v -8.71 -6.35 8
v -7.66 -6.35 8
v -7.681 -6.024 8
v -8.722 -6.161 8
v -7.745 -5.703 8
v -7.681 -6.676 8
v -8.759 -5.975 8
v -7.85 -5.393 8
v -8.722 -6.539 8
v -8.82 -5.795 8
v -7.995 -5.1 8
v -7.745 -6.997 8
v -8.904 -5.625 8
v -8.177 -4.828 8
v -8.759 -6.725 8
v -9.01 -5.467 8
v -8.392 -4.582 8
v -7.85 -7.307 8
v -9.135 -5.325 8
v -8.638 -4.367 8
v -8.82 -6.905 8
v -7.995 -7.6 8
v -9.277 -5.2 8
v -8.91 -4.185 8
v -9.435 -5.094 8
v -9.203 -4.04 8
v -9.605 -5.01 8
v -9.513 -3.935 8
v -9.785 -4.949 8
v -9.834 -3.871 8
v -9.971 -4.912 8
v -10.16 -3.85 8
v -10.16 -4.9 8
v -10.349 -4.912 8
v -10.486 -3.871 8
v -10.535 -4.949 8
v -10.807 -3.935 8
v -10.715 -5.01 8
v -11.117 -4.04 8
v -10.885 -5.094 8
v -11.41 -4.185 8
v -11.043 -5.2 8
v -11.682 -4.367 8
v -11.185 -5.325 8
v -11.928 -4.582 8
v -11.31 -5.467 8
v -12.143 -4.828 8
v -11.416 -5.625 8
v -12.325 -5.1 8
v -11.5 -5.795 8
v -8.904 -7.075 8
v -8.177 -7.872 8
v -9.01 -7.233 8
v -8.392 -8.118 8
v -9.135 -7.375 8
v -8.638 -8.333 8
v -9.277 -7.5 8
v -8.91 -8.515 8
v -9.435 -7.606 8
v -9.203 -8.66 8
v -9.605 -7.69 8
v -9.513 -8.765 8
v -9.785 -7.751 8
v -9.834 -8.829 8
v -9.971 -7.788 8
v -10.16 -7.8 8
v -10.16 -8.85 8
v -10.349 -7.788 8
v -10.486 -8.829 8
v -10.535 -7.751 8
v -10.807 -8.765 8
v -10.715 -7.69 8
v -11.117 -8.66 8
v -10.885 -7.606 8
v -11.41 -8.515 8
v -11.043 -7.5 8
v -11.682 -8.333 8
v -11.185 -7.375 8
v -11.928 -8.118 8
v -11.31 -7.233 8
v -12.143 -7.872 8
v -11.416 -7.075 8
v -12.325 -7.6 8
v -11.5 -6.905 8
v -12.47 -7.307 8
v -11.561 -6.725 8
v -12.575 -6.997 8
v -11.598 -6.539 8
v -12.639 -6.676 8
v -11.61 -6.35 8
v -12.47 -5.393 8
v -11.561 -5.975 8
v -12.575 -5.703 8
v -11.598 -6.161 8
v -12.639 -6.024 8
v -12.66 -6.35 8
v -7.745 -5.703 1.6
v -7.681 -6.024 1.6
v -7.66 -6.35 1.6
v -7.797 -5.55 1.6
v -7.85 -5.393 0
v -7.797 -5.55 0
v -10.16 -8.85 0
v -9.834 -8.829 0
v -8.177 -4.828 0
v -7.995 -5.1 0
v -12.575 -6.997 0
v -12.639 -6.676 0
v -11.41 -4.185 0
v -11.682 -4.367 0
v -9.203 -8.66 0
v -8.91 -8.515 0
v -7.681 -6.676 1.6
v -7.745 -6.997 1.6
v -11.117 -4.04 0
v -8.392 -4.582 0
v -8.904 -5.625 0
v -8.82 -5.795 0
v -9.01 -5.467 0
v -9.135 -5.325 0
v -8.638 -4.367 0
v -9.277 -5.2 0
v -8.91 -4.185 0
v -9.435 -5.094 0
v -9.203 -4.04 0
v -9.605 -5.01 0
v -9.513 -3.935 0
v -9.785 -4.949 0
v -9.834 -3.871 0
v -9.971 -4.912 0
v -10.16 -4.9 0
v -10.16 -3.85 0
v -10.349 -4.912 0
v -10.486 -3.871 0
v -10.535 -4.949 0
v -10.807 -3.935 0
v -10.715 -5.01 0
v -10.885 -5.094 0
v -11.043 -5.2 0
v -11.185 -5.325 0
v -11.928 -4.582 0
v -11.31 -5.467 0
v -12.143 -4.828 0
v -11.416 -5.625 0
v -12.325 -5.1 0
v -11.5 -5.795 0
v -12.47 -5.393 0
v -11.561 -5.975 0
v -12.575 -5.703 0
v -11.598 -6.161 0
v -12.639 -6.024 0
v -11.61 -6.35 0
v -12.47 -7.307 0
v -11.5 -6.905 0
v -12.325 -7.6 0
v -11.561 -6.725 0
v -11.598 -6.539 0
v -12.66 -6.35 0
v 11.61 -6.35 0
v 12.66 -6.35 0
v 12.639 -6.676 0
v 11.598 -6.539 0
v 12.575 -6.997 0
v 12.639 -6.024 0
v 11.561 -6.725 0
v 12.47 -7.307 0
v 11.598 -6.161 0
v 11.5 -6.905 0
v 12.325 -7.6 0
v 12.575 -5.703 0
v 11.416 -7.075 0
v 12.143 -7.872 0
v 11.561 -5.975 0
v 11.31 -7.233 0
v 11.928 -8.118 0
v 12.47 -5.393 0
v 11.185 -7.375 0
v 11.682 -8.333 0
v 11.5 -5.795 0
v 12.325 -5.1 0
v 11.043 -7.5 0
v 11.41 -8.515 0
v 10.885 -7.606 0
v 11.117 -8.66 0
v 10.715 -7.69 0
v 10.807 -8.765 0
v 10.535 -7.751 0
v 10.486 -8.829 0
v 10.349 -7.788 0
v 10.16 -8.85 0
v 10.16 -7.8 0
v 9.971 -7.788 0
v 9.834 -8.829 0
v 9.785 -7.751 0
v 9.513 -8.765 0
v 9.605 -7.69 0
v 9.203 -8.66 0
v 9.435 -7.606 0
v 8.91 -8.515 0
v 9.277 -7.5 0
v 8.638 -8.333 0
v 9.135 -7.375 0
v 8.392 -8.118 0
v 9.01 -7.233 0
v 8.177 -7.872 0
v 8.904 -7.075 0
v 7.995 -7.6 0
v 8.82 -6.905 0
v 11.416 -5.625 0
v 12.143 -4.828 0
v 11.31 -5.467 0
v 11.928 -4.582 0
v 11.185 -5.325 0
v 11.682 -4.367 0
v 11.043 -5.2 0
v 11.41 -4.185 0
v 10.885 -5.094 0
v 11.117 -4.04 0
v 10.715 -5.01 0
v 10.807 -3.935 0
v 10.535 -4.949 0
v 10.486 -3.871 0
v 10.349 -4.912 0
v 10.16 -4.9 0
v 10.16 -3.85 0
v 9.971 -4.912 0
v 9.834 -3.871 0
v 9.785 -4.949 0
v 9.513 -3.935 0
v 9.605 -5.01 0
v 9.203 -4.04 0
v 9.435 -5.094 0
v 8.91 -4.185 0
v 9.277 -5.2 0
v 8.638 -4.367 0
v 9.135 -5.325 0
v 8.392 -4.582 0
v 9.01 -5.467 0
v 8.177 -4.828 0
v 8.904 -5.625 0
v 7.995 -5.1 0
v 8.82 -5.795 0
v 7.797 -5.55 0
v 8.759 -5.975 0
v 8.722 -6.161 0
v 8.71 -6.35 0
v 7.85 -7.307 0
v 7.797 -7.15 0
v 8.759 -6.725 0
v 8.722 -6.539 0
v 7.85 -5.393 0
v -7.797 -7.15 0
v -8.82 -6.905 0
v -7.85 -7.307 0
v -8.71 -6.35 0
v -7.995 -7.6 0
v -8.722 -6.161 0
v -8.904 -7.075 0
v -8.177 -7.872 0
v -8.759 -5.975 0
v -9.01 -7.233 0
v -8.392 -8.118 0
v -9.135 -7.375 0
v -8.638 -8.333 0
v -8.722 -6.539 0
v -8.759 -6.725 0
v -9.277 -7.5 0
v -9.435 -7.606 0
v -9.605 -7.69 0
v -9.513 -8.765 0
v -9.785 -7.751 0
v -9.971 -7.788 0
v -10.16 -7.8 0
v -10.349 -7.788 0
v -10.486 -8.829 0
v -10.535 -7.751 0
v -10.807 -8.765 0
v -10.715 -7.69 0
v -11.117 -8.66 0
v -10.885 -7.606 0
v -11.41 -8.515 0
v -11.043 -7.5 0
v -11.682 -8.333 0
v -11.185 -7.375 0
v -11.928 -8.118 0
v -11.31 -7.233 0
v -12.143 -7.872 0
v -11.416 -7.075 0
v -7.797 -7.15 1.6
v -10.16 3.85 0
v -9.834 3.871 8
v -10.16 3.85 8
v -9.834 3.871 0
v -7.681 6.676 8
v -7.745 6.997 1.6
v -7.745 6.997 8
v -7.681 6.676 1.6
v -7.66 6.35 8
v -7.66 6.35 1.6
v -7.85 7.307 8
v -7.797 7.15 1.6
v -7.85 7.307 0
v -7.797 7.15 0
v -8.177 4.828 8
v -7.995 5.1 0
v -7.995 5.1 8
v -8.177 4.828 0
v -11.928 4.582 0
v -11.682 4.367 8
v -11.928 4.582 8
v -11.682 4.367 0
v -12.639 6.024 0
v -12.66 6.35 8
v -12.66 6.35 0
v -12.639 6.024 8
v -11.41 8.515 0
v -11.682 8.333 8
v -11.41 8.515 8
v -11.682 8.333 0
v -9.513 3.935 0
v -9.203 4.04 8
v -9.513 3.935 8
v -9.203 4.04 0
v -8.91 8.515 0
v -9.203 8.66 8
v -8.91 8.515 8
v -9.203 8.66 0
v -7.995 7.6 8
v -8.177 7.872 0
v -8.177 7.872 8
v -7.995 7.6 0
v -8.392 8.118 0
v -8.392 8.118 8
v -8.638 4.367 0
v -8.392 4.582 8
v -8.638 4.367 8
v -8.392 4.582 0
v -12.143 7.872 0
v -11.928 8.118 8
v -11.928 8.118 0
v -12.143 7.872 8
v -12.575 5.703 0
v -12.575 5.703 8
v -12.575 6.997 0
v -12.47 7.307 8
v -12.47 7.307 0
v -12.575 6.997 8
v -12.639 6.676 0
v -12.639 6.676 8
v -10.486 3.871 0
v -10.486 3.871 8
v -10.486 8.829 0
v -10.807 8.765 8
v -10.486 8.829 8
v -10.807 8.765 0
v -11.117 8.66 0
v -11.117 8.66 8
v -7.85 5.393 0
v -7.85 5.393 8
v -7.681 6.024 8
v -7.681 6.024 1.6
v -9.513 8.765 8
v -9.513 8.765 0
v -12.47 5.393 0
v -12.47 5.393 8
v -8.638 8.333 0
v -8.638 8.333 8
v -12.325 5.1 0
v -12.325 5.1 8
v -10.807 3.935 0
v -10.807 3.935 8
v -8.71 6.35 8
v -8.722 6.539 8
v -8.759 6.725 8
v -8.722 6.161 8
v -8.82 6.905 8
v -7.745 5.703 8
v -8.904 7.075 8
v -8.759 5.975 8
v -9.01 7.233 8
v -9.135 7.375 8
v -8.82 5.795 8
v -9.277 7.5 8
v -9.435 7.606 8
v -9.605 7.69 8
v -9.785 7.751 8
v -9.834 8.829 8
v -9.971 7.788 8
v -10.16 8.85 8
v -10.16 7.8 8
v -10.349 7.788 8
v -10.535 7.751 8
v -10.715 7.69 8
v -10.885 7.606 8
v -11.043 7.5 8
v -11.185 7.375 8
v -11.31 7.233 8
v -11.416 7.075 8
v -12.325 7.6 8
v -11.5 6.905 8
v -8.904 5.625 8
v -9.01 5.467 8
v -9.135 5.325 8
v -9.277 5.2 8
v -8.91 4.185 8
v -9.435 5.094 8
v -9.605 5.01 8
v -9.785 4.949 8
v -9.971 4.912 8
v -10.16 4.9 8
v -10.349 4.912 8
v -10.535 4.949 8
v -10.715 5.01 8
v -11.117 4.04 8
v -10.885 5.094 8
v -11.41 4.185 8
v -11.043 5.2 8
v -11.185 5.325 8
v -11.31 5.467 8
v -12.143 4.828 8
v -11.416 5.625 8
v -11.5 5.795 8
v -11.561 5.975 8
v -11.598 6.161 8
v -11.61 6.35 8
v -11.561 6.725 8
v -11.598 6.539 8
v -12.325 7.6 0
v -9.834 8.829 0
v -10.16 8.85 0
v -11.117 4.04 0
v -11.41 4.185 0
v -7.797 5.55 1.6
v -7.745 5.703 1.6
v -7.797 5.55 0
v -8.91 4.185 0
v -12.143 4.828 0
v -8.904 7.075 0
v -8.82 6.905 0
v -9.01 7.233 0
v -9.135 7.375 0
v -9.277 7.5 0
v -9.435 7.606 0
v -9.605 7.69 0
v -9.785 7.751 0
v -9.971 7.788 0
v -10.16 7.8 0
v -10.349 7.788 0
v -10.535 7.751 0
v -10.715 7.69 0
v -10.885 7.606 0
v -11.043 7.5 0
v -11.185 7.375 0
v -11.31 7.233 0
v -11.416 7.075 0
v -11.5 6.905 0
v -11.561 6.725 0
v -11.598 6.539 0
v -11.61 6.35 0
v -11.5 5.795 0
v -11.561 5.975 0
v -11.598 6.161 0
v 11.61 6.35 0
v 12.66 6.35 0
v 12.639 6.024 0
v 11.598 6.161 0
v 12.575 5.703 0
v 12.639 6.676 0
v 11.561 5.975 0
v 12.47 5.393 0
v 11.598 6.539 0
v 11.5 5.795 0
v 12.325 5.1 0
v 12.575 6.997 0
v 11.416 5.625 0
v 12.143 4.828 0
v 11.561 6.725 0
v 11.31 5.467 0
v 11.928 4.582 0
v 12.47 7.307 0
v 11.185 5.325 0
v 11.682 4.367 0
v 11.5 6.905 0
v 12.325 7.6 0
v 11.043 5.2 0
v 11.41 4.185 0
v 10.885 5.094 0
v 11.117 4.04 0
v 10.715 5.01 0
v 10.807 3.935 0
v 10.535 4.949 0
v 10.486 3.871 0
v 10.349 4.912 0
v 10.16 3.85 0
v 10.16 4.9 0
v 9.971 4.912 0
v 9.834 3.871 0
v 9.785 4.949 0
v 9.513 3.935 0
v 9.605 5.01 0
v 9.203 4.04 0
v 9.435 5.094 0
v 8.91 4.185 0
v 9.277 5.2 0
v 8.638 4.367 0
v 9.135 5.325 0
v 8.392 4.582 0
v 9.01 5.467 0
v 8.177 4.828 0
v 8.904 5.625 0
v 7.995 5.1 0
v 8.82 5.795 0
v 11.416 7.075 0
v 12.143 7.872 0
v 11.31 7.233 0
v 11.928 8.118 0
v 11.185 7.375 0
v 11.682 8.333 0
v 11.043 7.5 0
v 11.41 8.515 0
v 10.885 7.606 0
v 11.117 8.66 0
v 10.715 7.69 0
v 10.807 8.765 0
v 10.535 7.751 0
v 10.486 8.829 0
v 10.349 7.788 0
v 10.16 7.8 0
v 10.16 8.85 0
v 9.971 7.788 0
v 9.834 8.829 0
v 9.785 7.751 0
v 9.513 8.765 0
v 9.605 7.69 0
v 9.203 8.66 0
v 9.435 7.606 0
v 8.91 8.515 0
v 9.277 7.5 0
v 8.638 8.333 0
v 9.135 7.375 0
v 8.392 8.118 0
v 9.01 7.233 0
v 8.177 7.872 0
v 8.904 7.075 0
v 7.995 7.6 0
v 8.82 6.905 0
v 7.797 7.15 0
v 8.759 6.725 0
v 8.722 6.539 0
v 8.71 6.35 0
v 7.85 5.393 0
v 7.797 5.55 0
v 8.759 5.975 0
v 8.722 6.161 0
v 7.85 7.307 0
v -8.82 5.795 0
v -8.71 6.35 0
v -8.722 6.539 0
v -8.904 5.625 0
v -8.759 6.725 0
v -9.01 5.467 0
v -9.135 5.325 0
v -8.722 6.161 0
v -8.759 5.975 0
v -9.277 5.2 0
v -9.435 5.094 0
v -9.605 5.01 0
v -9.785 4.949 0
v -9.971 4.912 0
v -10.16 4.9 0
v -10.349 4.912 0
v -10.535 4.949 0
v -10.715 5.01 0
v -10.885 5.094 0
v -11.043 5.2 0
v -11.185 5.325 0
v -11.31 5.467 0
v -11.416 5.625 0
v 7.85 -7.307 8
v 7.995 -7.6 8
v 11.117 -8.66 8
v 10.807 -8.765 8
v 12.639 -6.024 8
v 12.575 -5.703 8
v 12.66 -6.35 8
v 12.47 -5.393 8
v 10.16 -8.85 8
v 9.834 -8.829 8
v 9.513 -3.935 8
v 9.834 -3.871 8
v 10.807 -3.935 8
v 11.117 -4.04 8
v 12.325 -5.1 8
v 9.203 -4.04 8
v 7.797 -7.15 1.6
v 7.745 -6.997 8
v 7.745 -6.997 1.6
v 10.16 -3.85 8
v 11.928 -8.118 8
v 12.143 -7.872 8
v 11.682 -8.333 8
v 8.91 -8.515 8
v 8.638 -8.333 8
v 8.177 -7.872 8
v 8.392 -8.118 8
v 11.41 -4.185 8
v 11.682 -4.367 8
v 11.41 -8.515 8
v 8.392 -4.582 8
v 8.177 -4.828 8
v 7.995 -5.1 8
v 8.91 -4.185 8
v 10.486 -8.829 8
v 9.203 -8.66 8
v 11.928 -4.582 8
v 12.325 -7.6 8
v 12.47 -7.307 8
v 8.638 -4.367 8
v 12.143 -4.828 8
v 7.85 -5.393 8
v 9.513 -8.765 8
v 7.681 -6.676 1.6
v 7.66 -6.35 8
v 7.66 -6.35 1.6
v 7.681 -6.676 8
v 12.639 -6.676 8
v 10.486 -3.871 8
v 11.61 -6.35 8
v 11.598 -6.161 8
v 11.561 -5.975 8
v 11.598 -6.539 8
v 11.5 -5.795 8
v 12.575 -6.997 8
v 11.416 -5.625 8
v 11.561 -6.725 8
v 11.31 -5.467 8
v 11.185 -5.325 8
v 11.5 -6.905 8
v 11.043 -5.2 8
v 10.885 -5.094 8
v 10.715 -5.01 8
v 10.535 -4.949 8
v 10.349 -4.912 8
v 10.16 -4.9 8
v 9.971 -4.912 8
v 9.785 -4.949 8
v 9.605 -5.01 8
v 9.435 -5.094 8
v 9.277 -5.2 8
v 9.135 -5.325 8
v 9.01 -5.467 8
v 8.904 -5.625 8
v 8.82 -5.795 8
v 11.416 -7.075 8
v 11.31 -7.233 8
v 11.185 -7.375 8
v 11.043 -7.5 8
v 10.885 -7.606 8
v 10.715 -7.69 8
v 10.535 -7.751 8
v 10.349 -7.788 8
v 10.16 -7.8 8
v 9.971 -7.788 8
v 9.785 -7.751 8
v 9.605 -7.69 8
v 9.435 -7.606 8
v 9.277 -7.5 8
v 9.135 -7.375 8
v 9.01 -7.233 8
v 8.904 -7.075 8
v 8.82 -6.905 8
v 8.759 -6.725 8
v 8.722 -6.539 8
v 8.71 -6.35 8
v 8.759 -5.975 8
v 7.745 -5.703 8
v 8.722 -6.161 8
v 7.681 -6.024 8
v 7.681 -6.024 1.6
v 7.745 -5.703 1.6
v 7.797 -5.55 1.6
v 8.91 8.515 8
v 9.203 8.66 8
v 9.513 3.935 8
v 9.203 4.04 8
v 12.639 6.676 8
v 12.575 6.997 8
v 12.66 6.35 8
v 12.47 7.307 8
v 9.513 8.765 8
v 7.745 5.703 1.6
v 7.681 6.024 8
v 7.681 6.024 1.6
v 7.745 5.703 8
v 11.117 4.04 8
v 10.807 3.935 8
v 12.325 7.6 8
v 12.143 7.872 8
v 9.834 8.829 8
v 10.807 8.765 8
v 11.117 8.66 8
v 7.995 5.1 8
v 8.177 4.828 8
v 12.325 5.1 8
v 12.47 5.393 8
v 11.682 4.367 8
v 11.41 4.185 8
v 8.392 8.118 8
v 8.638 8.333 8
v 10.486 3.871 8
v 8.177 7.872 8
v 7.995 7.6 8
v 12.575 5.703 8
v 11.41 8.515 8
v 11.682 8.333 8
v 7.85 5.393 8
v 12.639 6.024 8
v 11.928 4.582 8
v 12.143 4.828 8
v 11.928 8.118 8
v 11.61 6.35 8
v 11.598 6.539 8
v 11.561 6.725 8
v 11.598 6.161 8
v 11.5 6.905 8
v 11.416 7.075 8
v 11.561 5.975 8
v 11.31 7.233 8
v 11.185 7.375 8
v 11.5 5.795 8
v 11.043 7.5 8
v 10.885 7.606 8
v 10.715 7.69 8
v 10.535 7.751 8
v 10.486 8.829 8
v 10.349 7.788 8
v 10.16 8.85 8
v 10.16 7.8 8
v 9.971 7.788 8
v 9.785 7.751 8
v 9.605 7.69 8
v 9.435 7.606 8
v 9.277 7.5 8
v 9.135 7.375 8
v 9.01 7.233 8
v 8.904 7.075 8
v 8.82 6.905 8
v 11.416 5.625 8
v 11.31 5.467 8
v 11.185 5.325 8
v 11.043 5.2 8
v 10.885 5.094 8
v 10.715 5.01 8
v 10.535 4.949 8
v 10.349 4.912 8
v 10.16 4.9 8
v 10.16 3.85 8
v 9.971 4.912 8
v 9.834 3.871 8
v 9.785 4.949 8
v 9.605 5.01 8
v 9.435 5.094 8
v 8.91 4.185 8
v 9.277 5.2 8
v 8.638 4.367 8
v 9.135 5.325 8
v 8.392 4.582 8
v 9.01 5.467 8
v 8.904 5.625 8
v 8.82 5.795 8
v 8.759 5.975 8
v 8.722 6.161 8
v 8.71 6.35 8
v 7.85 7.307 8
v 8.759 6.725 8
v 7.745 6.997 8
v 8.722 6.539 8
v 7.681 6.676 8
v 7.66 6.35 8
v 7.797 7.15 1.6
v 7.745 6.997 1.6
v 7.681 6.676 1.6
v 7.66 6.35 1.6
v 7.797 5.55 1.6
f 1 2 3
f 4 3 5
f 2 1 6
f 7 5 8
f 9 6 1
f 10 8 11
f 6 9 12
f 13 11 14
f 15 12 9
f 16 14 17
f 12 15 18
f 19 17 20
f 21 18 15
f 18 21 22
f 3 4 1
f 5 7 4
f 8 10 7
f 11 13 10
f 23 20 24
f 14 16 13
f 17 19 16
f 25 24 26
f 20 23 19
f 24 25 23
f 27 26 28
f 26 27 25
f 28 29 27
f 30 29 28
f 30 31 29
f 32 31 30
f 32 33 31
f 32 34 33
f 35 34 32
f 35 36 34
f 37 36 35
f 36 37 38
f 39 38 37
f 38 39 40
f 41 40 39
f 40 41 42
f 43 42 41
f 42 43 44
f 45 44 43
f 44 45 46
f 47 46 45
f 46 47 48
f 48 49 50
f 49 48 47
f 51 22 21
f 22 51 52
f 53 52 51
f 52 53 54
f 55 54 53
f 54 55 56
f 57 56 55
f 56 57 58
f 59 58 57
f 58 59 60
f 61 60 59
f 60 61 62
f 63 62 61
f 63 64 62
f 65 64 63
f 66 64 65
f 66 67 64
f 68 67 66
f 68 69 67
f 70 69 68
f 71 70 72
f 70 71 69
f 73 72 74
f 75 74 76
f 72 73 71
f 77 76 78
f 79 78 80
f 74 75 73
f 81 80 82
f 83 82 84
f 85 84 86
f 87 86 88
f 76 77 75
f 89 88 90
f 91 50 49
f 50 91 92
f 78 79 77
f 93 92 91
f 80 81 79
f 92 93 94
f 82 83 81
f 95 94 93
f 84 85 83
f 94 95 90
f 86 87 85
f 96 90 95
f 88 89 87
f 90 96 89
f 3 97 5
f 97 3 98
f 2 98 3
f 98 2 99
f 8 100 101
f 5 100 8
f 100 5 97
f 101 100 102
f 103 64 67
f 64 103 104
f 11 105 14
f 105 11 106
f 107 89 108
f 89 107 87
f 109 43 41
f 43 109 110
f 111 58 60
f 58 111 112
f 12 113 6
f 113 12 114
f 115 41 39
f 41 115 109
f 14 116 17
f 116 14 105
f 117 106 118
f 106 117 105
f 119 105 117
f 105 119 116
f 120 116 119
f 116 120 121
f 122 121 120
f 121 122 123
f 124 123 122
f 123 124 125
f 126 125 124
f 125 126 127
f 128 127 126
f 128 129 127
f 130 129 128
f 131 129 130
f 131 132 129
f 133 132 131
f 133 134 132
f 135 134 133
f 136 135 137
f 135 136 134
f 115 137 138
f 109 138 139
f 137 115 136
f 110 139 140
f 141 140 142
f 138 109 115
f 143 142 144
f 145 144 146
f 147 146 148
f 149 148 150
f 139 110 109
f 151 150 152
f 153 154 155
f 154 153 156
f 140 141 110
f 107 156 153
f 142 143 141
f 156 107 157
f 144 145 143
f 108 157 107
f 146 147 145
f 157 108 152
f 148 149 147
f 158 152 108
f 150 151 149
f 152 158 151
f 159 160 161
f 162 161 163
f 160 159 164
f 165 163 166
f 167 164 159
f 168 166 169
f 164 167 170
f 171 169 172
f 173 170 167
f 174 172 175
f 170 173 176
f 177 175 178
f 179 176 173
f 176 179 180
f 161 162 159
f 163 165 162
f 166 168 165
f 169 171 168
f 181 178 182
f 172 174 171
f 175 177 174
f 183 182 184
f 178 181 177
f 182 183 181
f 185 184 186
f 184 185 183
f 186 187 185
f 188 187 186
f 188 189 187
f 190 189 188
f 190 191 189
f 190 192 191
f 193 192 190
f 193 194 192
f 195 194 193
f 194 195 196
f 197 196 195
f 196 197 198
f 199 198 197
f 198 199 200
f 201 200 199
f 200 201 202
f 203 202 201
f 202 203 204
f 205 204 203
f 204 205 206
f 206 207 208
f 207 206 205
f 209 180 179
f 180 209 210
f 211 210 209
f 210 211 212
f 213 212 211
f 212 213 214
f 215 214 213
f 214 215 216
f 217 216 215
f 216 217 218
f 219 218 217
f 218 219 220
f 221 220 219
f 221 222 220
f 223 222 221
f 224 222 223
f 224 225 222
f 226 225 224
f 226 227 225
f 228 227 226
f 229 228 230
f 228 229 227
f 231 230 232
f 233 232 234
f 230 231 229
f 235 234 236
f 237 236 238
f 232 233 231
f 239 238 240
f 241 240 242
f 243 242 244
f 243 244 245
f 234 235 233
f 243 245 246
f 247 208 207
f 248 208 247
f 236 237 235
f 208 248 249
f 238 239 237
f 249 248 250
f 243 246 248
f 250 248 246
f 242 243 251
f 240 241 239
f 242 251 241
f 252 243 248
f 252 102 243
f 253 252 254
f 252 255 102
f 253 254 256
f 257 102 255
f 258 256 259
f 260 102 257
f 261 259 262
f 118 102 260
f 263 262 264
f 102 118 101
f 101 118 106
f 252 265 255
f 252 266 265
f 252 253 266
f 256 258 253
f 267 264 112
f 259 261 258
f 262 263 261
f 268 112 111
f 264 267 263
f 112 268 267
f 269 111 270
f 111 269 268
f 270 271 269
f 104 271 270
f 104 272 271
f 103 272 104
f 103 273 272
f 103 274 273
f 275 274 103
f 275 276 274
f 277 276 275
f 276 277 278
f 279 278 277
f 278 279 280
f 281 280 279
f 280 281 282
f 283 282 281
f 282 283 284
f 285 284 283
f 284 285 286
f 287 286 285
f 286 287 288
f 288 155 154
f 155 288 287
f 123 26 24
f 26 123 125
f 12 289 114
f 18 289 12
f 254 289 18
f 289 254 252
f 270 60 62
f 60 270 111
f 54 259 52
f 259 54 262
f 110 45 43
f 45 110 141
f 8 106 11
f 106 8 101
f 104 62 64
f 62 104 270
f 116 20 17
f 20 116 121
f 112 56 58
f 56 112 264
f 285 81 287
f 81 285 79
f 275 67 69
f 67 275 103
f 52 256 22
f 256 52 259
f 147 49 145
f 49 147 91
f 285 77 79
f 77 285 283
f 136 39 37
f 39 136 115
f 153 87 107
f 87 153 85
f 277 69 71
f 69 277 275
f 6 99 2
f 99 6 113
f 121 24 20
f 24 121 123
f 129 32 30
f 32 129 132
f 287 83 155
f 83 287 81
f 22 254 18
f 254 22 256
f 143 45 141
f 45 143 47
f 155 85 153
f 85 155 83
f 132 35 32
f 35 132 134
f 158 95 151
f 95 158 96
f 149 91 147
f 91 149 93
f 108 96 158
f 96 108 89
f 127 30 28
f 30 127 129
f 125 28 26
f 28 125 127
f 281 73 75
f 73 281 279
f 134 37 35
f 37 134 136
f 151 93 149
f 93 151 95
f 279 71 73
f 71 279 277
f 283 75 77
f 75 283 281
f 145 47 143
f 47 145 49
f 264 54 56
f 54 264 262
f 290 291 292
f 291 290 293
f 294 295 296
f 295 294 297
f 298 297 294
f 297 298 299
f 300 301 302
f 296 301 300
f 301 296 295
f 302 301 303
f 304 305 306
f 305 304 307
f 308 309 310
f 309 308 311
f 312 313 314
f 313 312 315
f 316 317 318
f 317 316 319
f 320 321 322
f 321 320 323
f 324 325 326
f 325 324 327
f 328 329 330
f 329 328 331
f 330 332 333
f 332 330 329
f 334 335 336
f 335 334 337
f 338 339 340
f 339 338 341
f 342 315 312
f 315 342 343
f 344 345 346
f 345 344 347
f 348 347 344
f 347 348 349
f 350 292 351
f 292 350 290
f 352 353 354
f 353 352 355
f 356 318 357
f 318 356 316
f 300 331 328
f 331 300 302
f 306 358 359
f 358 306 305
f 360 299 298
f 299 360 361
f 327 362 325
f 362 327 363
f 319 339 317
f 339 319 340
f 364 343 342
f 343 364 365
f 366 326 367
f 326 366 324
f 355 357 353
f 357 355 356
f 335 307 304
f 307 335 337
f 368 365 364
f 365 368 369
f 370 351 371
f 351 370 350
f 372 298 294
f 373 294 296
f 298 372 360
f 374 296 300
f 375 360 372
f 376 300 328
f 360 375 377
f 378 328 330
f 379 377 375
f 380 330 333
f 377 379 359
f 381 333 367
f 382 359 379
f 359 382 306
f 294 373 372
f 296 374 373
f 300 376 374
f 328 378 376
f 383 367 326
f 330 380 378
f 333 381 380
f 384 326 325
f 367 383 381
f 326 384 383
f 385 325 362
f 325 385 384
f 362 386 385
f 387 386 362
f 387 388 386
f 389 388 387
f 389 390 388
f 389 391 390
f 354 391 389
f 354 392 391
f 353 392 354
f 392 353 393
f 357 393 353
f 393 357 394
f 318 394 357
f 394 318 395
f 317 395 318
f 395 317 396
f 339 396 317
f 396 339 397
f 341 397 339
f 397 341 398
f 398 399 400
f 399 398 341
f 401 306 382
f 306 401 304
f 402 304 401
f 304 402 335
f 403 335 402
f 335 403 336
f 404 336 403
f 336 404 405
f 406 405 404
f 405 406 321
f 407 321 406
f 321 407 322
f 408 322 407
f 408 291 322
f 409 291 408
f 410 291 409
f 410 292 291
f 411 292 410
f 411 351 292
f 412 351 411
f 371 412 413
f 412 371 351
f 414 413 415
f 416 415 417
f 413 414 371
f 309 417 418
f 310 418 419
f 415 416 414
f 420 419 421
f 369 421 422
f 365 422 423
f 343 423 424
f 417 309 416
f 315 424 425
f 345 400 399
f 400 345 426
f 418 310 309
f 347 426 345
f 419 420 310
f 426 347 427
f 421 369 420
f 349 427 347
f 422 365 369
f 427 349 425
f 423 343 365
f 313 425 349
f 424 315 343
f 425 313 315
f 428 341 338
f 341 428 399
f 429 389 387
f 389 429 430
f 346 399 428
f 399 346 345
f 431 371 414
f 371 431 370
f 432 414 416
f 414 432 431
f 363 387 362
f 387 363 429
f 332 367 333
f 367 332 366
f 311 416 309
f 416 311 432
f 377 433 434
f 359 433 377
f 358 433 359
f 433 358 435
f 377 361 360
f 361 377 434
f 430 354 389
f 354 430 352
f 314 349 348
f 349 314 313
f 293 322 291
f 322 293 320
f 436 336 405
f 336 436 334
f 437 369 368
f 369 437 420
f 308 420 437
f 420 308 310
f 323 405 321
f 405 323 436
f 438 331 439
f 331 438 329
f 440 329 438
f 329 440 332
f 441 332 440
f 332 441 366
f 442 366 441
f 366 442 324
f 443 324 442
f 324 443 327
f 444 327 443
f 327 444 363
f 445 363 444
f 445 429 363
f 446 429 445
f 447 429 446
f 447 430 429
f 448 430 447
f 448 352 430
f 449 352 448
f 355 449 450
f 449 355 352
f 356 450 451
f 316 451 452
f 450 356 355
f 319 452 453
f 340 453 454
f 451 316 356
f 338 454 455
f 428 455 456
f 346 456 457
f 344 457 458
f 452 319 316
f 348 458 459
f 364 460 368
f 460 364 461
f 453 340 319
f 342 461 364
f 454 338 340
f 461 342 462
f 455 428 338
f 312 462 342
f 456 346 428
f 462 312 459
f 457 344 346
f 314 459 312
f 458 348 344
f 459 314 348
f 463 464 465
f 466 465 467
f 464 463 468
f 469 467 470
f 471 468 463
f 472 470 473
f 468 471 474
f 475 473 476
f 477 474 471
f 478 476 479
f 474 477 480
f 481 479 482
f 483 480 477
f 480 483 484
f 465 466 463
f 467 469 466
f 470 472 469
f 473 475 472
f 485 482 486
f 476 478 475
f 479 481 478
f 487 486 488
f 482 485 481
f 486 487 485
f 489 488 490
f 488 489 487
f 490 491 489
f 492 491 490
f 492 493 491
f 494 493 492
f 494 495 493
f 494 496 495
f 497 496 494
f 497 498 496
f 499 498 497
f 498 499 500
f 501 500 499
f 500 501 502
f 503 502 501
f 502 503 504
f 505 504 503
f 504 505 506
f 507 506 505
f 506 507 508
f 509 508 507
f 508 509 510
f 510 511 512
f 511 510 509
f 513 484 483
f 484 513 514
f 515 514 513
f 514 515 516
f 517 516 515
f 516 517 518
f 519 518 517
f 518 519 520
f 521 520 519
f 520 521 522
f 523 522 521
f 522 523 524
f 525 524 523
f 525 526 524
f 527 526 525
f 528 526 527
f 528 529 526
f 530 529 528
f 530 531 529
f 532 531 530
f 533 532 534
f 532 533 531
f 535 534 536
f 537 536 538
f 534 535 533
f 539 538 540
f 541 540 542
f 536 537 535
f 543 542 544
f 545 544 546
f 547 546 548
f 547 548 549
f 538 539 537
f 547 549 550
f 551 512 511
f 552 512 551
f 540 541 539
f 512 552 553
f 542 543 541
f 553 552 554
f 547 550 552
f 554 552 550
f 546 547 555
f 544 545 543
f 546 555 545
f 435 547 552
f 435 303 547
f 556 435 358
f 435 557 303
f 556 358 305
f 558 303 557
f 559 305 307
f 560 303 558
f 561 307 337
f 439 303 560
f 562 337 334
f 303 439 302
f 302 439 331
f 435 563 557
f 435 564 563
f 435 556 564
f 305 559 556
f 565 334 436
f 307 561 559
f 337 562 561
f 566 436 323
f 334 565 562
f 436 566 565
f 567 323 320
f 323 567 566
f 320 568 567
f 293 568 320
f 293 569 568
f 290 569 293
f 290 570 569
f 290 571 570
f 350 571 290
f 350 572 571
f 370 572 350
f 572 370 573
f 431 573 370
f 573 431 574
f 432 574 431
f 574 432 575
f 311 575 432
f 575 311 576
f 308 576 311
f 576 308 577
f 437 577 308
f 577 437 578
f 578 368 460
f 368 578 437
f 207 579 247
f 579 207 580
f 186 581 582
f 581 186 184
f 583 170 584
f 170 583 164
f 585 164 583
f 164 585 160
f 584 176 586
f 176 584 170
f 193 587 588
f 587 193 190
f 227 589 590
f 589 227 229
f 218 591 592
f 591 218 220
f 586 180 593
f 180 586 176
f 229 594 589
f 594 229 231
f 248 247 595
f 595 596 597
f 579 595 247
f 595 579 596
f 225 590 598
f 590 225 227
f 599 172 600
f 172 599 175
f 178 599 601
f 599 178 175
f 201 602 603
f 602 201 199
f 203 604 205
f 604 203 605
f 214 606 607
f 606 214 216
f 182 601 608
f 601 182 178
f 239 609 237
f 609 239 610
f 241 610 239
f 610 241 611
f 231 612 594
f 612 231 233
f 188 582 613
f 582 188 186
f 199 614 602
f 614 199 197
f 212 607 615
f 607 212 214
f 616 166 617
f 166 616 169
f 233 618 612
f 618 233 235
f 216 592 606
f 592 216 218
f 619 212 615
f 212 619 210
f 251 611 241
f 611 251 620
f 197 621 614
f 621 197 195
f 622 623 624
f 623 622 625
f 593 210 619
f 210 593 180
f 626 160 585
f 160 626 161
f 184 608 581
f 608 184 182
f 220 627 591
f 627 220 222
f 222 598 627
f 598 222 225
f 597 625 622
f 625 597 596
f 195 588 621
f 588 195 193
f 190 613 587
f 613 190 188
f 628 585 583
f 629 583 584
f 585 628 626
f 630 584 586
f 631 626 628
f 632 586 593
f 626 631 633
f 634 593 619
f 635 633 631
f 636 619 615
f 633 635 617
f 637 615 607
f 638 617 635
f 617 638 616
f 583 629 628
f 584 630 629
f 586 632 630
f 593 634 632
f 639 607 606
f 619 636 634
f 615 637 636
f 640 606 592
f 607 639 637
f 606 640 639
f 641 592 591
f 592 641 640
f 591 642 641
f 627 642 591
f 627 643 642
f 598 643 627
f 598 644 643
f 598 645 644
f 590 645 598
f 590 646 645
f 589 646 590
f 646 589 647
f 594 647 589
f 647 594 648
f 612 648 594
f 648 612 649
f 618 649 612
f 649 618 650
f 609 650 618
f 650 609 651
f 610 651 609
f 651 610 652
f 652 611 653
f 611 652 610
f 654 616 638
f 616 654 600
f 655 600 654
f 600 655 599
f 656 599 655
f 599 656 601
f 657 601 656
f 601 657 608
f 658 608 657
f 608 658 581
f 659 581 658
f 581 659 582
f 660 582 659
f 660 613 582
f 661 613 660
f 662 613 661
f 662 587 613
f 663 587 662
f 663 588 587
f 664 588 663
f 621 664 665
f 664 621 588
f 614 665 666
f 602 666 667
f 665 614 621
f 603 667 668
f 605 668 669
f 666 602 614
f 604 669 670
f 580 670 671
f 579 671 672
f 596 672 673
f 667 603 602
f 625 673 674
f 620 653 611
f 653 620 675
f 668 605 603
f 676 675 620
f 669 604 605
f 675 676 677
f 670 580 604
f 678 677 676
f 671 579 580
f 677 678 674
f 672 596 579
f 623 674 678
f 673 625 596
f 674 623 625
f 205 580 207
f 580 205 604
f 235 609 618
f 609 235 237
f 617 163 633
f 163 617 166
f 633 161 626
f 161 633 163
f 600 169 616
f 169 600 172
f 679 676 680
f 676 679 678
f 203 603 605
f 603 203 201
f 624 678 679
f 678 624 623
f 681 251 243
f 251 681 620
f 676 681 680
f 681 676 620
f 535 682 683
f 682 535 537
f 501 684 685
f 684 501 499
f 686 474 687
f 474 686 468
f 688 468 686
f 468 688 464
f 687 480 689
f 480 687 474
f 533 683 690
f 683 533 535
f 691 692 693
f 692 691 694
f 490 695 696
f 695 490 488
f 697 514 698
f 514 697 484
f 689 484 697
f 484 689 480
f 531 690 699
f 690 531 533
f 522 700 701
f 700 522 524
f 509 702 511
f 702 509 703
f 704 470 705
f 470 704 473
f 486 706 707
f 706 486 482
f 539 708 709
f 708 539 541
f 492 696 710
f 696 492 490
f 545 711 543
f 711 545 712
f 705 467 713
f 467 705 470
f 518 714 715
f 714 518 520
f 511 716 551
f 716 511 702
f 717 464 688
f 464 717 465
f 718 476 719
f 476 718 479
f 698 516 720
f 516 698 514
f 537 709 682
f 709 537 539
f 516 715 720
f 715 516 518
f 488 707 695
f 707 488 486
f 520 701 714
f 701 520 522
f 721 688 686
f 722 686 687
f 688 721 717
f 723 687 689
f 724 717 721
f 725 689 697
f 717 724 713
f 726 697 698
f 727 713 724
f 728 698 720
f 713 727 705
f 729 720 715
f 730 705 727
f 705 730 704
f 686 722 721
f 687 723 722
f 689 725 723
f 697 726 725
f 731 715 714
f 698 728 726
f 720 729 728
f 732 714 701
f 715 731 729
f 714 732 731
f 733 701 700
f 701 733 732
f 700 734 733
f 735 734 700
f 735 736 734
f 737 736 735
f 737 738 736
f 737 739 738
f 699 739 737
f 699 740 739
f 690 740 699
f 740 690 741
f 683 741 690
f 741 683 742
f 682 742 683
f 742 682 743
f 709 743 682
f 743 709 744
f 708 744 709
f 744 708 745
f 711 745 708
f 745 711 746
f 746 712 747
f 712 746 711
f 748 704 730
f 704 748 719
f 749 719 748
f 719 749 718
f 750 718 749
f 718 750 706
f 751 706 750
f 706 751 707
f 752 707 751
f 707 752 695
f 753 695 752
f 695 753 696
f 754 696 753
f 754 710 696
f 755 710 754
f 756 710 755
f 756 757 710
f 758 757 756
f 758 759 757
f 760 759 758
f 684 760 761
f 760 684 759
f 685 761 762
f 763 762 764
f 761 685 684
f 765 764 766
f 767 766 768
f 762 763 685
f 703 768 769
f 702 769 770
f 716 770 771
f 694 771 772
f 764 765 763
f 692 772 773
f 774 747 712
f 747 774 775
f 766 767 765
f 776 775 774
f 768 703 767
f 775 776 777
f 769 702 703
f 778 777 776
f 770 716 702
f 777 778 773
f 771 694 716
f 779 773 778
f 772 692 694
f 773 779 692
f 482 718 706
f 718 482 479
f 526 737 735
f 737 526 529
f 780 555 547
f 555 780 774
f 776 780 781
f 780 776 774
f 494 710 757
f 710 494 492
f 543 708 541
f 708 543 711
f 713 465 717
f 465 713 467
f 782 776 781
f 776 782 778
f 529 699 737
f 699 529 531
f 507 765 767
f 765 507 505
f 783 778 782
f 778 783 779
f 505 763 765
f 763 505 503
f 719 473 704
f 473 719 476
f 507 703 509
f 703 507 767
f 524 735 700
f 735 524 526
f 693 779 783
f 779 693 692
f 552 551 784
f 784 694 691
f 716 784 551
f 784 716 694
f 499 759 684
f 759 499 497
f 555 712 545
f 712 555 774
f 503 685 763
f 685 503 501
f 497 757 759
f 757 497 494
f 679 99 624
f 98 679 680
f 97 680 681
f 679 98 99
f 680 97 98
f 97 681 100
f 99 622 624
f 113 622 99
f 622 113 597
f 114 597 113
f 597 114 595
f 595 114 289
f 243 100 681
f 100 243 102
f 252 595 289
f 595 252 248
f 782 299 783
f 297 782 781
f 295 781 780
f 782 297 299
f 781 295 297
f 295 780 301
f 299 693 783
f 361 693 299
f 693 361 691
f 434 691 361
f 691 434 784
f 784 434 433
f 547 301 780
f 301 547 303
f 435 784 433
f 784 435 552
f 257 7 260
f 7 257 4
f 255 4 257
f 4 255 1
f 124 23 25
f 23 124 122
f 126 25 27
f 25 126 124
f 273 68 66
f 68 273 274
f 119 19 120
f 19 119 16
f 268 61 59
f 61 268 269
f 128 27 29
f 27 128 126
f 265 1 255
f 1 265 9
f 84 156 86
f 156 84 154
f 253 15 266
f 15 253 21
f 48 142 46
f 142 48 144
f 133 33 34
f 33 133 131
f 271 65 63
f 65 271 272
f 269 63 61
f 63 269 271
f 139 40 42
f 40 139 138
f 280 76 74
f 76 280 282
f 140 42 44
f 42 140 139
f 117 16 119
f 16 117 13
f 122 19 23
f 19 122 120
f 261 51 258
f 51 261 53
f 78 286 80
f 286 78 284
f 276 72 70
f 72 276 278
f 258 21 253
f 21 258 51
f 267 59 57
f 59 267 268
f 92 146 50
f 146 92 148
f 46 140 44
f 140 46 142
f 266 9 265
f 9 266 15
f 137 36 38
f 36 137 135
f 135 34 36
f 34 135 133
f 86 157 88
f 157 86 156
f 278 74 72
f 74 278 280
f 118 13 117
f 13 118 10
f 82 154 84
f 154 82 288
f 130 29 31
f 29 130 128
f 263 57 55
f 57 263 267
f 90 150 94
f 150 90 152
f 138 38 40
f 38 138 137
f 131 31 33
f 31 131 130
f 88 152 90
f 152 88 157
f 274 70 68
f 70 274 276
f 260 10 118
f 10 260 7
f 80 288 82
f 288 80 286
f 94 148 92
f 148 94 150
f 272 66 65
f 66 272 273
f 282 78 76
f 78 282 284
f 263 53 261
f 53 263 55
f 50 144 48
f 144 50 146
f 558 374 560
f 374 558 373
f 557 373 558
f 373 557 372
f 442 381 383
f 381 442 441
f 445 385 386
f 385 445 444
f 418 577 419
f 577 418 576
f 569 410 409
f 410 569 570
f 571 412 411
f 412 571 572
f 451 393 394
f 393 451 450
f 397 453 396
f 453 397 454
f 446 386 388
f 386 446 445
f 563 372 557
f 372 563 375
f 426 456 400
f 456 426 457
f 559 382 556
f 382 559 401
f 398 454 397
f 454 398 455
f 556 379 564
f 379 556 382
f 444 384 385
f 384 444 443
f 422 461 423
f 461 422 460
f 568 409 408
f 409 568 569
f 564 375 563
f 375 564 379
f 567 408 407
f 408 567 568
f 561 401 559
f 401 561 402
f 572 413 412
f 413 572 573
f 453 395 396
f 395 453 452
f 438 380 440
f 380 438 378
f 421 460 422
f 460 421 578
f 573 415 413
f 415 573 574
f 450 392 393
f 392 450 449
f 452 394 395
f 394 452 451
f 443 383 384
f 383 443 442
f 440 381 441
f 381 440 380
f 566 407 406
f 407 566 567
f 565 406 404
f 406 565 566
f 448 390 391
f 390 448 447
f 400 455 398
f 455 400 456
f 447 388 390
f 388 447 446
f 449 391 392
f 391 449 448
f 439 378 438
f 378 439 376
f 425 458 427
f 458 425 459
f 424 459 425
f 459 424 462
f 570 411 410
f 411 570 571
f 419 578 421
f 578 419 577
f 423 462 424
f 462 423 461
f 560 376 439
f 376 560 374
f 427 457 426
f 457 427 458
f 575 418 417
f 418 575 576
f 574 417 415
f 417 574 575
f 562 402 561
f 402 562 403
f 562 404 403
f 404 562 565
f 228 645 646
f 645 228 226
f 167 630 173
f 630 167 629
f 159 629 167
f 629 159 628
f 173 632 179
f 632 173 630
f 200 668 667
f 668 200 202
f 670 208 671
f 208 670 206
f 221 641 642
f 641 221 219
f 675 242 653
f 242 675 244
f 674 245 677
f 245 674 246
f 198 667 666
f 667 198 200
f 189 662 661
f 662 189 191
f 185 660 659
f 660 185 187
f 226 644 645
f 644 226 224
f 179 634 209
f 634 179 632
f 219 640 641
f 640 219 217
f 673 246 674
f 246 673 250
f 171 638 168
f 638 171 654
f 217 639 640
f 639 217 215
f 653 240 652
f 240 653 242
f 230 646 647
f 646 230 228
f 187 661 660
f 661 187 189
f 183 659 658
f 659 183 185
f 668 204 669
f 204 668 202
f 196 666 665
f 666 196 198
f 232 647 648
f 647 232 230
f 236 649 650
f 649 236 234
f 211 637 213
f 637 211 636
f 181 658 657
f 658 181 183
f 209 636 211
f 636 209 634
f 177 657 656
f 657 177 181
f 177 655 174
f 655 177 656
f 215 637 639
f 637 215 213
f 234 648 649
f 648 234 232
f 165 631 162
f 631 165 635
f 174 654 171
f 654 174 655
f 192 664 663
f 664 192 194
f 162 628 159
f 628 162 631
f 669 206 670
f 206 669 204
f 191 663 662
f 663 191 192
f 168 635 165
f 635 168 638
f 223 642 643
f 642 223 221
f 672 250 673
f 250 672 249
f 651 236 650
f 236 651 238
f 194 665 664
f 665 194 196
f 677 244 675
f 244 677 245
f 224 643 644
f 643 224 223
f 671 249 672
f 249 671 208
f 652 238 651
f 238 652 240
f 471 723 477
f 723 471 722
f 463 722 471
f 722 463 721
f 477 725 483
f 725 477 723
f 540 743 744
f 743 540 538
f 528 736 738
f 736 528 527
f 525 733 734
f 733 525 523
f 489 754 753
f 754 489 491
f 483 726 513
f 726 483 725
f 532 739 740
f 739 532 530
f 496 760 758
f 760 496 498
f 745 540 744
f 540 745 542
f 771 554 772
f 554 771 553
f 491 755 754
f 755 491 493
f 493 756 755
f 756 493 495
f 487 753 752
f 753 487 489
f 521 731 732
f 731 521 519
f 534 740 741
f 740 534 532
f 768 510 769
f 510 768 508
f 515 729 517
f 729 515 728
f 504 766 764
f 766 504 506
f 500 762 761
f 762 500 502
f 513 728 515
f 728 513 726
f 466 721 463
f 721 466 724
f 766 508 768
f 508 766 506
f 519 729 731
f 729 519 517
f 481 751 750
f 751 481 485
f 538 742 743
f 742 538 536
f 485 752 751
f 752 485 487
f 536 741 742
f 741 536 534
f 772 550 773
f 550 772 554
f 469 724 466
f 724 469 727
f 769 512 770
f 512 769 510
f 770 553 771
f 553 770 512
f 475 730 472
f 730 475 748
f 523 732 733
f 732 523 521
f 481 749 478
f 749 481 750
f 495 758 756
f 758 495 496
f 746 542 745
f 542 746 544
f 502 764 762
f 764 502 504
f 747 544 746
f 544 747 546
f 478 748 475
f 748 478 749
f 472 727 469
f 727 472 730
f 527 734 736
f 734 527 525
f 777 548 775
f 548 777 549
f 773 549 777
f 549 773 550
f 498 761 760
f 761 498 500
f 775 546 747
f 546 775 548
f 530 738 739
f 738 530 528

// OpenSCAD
// file: box.scad
// Stand-in for the 63 x 58 x 35 ABS box (black or clear lid), for assemblies. Not a print.
// Origin: centre of the inside floor. x along the 63 side, y along the 58 side, z up.
// Numbers are the vendor's or read off vendor photos; README lists which. None calipered.

/* [Box, vendor] */
box_l = 63;          // outer, x
box_w = 58;          // outer, y
box_h = 35;          // outer, lid on
col_clear = 39;      // clear wall between corner columns, both walls

/* [Box, read off photos] */
box_wall = 2.5;      // gives the vendor's 53 inside across y
box_floor = 3;
lid_h = 8.5;         // lid outer height
lid_top = 2.5;       // lid plate thickness
lid_lip = 4;         // lid's inner rim, in from the inside wall face
gasket_step = 4.5;   // thickened wall band under the seam
gasket_in = 1.5;     // how far that band stands in from the wall
boss_pitch = 41;     // floor screw bosses, along x, centred (39 to 42.5 by pixel scale)
boss_d = 6;
boss_h = 4;
boss_hole = 2.5;     // takes an M3 self-tapper (guess)
boss_wing = 10;      // wing length across y
boss_wing_t = 2;
boss_wing_h = 2.5;

in_l = box_l - 2*box_wall;                 // 58
in_w = box_w - 2*box_wall;                 // 53
col_x = (in_l - col_clear) / 2;            // 9.5, column size along x
col_y = (in_w - col_clear) / 2;            // 7, column size along y
rim_z = box_h - lid_h - box_floor;         // 23.5, seam above the inside floor
ceil_z = box_h - lid_top - box_floor;      // 29.5, lid underside above the inside floor
wall_top_z = rim_z - gasket_step;          // 19, top of the plain wall a nut can seat on

module box_columns(h = rim_z) {
    for (sx = [-1, 1], sy = [-1, 1]) scale([sx, sy, 1])
        translate([in_l/2 - col_x, in_w/2 - col_y, 0]) cube([col_x, col_y, h]);
}

module box_bosses() {
    for (sx = [-1, 1]) translate([sx*boss_pitch/2, 0, 0]) difference() {
        union() {
            cylinder(d = boss_d, h = boss_h, $fn = 32);
            translate([-boss_wing_t/2, -boss_wing/2, 0]) cube([boss_wing_t, boss_wing, boss_wing_h]);
        }
        translate([0, 0, 0.5]) cylinder(d = boss_hole, h = boss_h, $fn = 24);
    }
}

// holes: list of [wall, along, z, dia]; wall is "x+", "x-", "y+", "y-"; along is the position along that wall from its centre
module wall_hole(h) {
    wall = h[0]; a = h[1]; z = h[2]; d = h[3];
    if (wall == "y+" || wall == "y-") translate([a, (wall == "y+" ? 1 : -1) * (in_w/2 + box_wall/2), z])
        rotate([90, 0, 0]) cylinder(d = d, h = box_wall + 4, center = true, $fn = 48);
    else translate([(wall == "x+" ? 1 : -1) * (in_l/2 + box_wall/2), a, z])
        rotate([0, 90, 0]) cylinder(d = d, h = box_wall + 4, center = true, $fn = 48);
}

module box_body(holes = []) {
    difference() {
        translate([-box_l/2, -box_w/2, -box_floor]) cube([box_l, box_w, box_floor + rim_z]);
        translate([-in_l/2, -in_w/2, 0]) cube([in_l, in_w, rim_z + 1]);
        for (h = holes) wall_hole(h);
    }
    difference() {
        union() {
            box_columns();
            translate([0, 0, wall_top_z]) difference() {      // gasket band
                translate([-in_l/2, -in_w/2, 0]) cube([in_l, in_w, gasket_step]);
                translate([-in_l/2 + gasket_in, -in_w/2 + gasket_in, -1]) cube([in_l - 2*gasket_in, in_w - 2*gasket_in, gasket_step + 2]);
            }
        }
        for (h = holes) wall_hole(h);
    }
    box_bosses();
}

module box_lid() {
    translate([0, 0, rim_z]) difference() {
        translate([-box_l/2, -box_w/2, 0]) cube([box_l, box_w, lid_h]);
        translate([-in_l/2 + lid_lip, -in_w/2 + lid_lip, -1]) cube([in_l - 2*lid_lip, in_w - 2*lid_lip, lid_h - lid_top + 1]);
    }
}

// The space parts may occupy: the cross-shaped floor up to the gasket band, then the lid's recess.
module box_free() {
    difference() {
        translate([-in_l/2, -in_w/2, 0]) cube([in_l, in_w, wall_top_z]);
        box_columns(wall_top_z + 1);
    }
    translate([-in_l/2 + gasket_in, -in_w/2 + gasket_in, wall_top_z]) difference() {
        cube([in_l - 2*gasket_in, in_w - 2*gasket_in, gasket_step]);
        translate([-gasket_in, -gasket_in, -1]) intersection() { translate([gasket_in, gasket_in, 0]) cube([in_l - 2*gasket_in, in_w - 2*gasket_in, 10]); box_columns(10); }
    }
    translate([-in_l/2 + lid_lip, -in_w/2 + lid_lip, rim_z]) cube([in_l - 2*lid_lip, in_w - 2*lid_lip, ceil_z - rim_z]);
}
// file: model.scad
// Carrier for two stacked Adafruit STEMMA QT boards (25.4 x 17.78, holes 20.32 x 12.7) in the 63 x 58 x 35 box.
// Screws to the box's two floor bosses; four M2.5 x 20 screws come up through the posts, the lower board,
// the spacer and the upper board, with nuts on top. Print as shown: plate on the bed, posts up, no supports.
include <box.scad>
part = "carrier";    // carrier | spacer

/* [Plate] */
plate_l = 51;        // x; inside the 58 floor, clear of the short walls
plate_w = 21;        // y
plate_t = 2;
plate_y = -4;        // plate and stack centre, off the box centre, away from the connector wall
corner_r = 2;

/* [Floor bosses] */
slot_w = 3.4;        // M3 self-tapper clearance
slot_play = 2.5;     // each way along x; covers the 39 to 42.5 guess for the boss pitch

/* [Board bays] */
hole_dx = 20.32;     // Adafruit board file
hole_dy = 12.7;
post_h = 3;          // lower board's underside above the plate; clears its solder joints
post_d = 5.5;
screw_d = 2.9;       // M2.5 clearance, printed
head_d = 5;          // M2.5 pan head, in a pocket under the plate
head_h = 1.2;        // pocket depth; the rest of the head hangs in the 4 mm under the plate
spacer_h = 8;        // between the boards; room for the lower board's parts and its plugs
spacer_d = 5;
spacer_web = 1.6;    // bars joining the spacer tubes in pairs

/* [Hidden] */
$fn = 48;
posts = [for (sx = [-1, 1], sy = [-1, 1]) [sx*hole_dx/2, plate_y + sy*hole_dy/2]];

module rrect(l, w, r) { hull() for (sx = [-1, 1], sy = [-1, 1]) translate([sx*(l/2 - r), sy*(w/2 - r)]) circle(r = r); }

module carrier() {
    difference() {
        union() {
            linear_extrude(plate_t) union() {
                translate([0, plate_y]) rrect(plate_l, plate_w, corner_r);
                rrect(plate_l, 10, corner_r);                      // boss tabs sit on the box centre line
            }
            for (p = posts) translate([p[0], p[1], 0]) cylinder(d = post_d, h = plate_t + post_h);
        }
        for (sx = [-1, 1]) translate([sx*boss_pitch/2, 0, -1]) linear_extrude(plate_t + 2)
            hull() for (d = [-slot_play, slot_play]) translate([d, 0]) circle(d = slot_w);
        for (p = posts) translate([p[0], p[1], -1]) {
            cylinder(d = screw_d, h = plate_t + post_h + 2);
            cylinder(d = head_d, h = head_h + 1);
        }
        translate([0, plate_y, -1]) linear_extrude(plate_t + 2) rrect(hole_dx - post_d - 3, hole_dy - 2, 2);   // lightening window
    }
}

module spacer() {
    difference() {
        union() {
            for (p = posts) translate([p[0], p[1] - plate_y, 0]) cylinder(d = spacer_d, h = spacer_h);
            for (sy = [-1, 1]) translate([-hole_dx/2, sy*hole_dy/2 - spacer_web/2, 0]) cube([hole_dx, spacer_web, spacer_web]);   // bars on the long sides only: the ends stay open for the plugs
        }
        for (p = posts) translate([p[0], p[1] - plate_y, -1]) cylinder(d = screw_d, h = spacer_h + 2);
    }
}

if (part == "carrier") carrier();
if (part == "spacer") spacer();
// main file
// The spacer frame between the two boards. Print flat, web down.
include <model.scad>
part = "spacer";
